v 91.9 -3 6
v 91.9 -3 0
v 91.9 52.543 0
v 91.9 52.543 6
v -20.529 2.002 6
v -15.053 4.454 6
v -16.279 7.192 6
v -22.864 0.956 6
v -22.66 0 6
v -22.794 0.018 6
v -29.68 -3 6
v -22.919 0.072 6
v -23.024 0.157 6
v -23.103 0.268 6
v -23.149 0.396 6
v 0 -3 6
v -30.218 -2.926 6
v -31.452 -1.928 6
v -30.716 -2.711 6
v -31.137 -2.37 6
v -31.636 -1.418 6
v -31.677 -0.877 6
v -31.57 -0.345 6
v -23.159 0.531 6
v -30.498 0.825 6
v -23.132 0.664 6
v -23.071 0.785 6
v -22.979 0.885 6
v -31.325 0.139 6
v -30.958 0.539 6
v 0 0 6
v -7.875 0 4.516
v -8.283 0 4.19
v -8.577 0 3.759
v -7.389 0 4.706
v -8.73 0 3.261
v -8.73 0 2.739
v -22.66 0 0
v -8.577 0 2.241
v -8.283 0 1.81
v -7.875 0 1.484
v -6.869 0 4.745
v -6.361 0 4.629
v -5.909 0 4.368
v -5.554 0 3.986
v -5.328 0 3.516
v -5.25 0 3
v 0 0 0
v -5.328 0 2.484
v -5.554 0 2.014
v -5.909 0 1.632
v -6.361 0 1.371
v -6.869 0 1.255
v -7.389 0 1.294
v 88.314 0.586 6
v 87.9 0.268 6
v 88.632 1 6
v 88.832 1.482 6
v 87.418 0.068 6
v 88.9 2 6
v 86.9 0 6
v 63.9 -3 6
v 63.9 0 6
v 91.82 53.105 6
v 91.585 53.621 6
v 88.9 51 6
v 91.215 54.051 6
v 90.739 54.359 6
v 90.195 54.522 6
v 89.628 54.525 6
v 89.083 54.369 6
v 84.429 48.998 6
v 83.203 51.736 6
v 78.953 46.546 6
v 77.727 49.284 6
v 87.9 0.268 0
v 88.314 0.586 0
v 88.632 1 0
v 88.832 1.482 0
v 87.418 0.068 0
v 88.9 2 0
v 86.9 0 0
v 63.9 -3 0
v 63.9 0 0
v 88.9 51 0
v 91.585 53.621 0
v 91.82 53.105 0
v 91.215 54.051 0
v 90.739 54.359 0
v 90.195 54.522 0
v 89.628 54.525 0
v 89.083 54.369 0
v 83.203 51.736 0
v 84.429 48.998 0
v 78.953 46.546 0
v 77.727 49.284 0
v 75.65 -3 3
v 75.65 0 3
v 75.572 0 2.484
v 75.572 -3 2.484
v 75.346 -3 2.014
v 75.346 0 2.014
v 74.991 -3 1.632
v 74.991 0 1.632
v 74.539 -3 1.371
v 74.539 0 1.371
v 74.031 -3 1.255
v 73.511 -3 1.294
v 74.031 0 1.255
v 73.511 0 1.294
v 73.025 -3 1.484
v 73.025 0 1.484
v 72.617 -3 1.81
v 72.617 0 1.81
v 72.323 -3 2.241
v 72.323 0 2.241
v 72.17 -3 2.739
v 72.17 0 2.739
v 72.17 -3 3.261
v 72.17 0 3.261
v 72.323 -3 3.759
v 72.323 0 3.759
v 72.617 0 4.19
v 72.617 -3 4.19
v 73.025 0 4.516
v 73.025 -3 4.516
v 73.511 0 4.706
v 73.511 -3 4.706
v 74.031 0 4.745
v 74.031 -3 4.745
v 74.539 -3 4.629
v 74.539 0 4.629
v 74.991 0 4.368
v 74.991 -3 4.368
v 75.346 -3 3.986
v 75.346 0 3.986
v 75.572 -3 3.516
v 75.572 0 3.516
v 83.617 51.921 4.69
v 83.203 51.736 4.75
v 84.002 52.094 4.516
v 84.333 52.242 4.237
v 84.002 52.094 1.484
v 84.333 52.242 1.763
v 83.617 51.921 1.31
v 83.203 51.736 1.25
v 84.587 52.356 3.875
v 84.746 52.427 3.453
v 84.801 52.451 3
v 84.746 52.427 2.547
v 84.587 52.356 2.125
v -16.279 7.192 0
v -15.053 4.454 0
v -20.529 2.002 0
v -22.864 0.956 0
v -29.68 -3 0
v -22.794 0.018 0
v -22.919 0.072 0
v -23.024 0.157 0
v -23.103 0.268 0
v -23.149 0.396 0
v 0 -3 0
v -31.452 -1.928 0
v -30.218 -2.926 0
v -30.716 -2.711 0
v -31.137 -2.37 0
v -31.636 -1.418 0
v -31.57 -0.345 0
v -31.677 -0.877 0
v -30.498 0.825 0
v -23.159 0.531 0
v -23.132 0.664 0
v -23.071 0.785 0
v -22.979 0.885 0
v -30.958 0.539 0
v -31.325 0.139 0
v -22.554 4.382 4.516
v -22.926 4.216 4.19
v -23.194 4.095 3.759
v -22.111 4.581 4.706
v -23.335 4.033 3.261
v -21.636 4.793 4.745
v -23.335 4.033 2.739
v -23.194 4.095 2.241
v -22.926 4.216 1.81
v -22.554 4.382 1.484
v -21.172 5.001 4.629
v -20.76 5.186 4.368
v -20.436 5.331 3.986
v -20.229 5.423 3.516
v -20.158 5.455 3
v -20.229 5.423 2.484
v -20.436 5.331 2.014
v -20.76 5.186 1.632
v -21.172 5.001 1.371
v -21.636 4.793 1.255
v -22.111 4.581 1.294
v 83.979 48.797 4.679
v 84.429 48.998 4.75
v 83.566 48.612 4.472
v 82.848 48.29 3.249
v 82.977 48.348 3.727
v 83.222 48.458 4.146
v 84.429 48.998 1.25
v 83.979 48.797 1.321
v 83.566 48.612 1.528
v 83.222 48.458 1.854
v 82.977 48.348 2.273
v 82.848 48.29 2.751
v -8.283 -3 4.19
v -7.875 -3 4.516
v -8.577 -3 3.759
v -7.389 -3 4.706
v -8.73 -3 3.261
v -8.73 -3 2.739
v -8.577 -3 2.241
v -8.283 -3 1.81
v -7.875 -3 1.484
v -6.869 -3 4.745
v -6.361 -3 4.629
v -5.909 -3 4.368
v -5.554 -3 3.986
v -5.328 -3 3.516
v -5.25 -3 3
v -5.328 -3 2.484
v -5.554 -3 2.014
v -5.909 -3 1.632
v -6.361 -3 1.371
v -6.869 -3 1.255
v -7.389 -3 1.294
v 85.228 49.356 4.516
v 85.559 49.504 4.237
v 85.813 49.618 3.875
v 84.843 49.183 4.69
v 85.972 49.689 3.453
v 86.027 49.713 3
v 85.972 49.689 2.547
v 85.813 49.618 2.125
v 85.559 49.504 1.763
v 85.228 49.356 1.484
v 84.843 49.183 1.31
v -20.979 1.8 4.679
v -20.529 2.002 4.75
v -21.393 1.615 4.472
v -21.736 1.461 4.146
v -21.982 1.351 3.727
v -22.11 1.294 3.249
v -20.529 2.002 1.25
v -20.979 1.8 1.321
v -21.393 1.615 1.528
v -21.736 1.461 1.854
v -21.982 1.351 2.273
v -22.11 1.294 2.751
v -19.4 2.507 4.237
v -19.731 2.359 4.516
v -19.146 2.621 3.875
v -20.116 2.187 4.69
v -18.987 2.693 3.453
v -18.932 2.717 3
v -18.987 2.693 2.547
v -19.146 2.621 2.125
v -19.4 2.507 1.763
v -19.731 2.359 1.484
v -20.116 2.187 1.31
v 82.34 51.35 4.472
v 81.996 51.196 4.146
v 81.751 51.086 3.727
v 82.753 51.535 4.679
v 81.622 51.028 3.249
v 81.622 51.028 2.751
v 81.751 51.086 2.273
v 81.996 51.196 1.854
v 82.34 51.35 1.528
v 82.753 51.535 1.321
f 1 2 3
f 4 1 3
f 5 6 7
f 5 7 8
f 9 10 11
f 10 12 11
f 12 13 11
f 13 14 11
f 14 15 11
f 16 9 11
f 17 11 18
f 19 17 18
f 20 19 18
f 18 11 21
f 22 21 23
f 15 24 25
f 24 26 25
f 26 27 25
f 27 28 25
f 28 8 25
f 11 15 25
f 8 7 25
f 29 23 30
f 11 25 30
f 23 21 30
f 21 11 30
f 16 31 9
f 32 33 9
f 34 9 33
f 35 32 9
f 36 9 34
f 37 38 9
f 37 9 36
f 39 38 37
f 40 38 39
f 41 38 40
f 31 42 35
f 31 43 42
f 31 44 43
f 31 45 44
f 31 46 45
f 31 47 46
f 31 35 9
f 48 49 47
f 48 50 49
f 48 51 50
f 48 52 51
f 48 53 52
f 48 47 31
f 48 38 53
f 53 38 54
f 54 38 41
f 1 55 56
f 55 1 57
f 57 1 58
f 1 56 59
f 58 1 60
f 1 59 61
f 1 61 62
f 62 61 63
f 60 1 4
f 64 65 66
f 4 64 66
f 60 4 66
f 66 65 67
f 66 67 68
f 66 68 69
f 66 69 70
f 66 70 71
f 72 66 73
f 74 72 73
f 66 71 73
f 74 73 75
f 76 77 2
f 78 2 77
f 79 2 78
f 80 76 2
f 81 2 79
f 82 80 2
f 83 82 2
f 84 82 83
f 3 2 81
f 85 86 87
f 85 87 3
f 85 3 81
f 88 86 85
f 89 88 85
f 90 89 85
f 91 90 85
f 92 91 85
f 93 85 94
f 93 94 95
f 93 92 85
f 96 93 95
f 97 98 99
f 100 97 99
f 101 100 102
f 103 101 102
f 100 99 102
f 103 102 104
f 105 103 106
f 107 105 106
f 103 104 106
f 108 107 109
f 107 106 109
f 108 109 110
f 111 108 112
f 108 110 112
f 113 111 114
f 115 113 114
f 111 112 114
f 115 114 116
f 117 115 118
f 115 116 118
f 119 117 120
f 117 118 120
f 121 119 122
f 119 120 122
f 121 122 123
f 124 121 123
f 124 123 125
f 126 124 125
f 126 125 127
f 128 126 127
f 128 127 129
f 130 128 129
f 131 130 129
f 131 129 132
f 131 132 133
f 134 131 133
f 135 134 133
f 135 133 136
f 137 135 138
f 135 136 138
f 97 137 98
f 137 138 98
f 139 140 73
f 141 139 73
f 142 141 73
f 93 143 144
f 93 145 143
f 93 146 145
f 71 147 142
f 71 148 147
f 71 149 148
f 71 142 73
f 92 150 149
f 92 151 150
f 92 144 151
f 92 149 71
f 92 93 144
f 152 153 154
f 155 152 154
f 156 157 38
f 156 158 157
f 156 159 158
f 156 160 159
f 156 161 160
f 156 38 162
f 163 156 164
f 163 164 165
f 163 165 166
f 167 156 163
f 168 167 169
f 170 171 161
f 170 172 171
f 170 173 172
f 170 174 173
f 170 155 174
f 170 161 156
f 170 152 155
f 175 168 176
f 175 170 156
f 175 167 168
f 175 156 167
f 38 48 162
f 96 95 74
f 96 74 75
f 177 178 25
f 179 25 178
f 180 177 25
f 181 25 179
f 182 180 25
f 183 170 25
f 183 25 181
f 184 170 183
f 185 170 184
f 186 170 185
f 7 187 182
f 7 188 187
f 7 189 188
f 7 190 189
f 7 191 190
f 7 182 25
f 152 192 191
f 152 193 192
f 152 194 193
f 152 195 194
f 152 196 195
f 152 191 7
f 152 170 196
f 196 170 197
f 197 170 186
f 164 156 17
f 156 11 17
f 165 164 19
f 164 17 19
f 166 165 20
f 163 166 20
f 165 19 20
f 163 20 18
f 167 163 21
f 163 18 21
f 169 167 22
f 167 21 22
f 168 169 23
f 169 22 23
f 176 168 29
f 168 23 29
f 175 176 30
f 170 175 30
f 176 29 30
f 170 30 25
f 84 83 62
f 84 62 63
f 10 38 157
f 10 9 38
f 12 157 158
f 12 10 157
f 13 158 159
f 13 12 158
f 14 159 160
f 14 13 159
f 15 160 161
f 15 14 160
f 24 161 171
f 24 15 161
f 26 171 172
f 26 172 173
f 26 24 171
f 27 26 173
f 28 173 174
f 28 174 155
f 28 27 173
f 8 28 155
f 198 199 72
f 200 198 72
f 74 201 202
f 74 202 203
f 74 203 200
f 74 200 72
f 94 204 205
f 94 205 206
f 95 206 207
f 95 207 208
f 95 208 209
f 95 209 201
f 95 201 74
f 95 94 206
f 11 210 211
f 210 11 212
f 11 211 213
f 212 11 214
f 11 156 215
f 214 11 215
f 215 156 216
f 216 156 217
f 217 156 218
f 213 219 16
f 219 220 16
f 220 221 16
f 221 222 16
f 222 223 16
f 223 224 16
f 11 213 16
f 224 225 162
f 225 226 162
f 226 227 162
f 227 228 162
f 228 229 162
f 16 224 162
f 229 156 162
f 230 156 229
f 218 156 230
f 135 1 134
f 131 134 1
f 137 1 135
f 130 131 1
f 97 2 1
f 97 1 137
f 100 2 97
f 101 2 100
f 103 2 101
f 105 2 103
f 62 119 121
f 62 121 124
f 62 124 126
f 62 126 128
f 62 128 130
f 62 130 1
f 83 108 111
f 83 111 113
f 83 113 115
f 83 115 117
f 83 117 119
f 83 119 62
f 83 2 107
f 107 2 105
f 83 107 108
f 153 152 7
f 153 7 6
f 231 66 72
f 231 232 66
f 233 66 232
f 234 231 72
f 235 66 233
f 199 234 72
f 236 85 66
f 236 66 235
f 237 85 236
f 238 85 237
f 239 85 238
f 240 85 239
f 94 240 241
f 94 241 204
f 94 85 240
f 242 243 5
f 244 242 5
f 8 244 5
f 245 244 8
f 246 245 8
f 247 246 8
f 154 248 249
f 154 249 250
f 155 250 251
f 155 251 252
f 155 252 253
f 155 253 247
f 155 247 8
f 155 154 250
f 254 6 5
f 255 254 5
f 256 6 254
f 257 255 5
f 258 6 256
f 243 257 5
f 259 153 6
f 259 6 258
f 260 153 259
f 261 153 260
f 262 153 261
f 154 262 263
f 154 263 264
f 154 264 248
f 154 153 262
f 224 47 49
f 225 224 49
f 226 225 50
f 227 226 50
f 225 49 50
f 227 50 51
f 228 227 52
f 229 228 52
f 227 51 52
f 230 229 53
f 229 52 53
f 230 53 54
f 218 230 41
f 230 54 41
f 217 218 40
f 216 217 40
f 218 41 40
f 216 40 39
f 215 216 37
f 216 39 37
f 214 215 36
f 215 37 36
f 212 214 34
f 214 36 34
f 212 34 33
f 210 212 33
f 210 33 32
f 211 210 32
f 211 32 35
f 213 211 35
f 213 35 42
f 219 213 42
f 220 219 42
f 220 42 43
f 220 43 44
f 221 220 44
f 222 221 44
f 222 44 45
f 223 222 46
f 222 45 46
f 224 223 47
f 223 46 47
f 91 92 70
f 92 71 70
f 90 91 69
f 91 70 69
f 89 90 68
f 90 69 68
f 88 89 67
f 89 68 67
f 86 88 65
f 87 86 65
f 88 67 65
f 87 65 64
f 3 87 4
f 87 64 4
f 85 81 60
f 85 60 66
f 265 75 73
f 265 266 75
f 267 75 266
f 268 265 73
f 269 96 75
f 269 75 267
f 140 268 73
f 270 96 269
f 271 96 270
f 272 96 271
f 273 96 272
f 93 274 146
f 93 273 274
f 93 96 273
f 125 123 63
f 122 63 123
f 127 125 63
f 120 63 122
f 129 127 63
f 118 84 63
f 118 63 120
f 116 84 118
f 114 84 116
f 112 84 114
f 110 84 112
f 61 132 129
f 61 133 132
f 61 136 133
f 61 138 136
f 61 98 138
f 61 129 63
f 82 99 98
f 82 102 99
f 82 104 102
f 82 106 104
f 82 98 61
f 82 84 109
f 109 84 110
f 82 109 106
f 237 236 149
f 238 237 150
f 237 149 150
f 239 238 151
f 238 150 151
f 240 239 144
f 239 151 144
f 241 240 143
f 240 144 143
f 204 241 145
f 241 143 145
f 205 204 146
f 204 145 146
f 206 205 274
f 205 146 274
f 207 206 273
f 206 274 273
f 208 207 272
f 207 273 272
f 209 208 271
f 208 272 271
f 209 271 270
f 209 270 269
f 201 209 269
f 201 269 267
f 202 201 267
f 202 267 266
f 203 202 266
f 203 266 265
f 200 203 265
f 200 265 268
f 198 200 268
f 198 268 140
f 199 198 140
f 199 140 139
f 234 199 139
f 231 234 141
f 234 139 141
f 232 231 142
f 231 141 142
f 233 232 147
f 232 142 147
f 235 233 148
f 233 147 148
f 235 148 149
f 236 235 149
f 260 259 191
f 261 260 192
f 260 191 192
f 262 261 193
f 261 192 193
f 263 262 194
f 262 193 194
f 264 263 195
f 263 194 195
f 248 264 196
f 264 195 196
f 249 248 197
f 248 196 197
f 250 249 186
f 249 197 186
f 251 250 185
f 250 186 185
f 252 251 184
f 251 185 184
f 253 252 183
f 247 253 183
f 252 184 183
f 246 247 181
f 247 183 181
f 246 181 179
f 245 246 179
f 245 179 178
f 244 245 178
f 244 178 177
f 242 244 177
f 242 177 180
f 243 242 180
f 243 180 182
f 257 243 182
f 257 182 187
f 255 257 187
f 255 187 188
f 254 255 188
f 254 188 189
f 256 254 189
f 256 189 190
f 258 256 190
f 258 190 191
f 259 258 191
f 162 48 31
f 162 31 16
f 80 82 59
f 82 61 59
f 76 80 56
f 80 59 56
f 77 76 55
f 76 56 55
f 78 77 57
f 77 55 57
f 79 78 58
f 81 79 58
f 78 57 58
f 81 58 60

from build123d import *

# Parameters (mm, degrees)
BOSS_EXTRUDE1_DEPTH   = 6
BOSS_EXTRUDE1_2_DEPTH = 6
FILLET1_R             = 2
FILLET2_R             = 2
FILLET3_R             = 2
FILLET4_R             = 0.5
SKETCH2_R             = 1.75
CUT_EXTRUDE1_DEPTH    = 3
SKETCH3_R             = 1.75
CUT_EXTRUDE2_DEPTH    = 3


with BuildPart() as part:
    # Sketch1 → Boss-Extrude1 (new body)
    with BuildSketch(Plane.XY):
        Polygon((-25, 0), (0, 0), (0, -3), (-25, -3), (-39.040980861, -3), (-16.279249839, 7.191819861), (-15.053255633, 4.453766135), (-20.529363085, 2.001777723), align=None)
    extrude(amount=BOSS_EXTRUDE1_DEPTH)

    # Fillet1
    fillet1_edges = [part.edges().sort_by_distance(p)[0] for p in [
        (-39.040980861, -3, 3),
    ]]
    fillet(fillet1_edges, radius=FILLET1_R)

    # Fillet4
    fillet4_edges = [part.edges().sort_by_distance(p)[0] for p in [
        (-25, 0, 3),
    ]]
    fillet(fillet4_edges, radius=FILLET4_R)


with BuildPart() as body_2:
    # Sketch1 → Boss-Extrude1 2 (new body)
    with BuildSketch(Plane.XY):
        Polygon((88.9, 0), (88.9, 51), (84.429363085, 48.998222277), (78.953255633, 46.546233865), (77.727261427, 49.284287592), (83.203368879, 51.736276003), (91.9, 55.630289938), (91.9, 51), (91.9, -3), (63.9, -3), (63.9, 0), align=None)
    extrude(amount=BOSS_EXTRUDE1_2_DEPTH)

    # Fillet2
    fillet2_edges = [body_2.edges().sort_by_distance(p)[0] for p in [
        (91.9, 55.630289938, 3),
    ]]
    fillet(fillet2_edges, radius=FILLET2_R)

    # Fillet3
    fillet3_edges = [body_2.edges().sort_by_distance(p)[0] for p in [
        (88.9, 0, 3),
    ]]
    fillet(fillet3_edges, radius=FILLET3_R)


with BuildPart() as cut_extrude1_tool:
    # Sketch2 → Cut-Extrude1 (new body)
    with BuildSketch(Plane(origin=(-5.401165852, 12.062603735, 0), x_dir=(0.912684575, 0.408664735, 0), z_dir=(-0.408664735, 0.912684575, 0))):
        with Locations((97.081222933, -3)):
            Circle(SKETCH2_R)
        with Locations((-17.918777067, -3)):
            Circle(SKETCH2_R)
    extrude(amount=-CUT_EXTRUDE1_DEPTH)


with BuildPart() as part_1:
    add(part.part)

    # Cut-Extrude1: cut by cut_extrude1_tool
    add(cut_extrude1_tool.part, mode=Mode.SUBTRACT)


with BuildPart() as body_2_1:
    add(body_2.part)

    # Cut-Extrude1: cut by cut_extrude1_tool
    add(cut_extrude1_tool.part, mode=Mode.SUBTRACT)


with BuildPart() as cut_extrude2_tool:
    # Sketch3 → Cut-Extrude2 (new body)
    with BuildSketch(Plane(origin=(0, 0, 0), x_dir=(1, 0, 0), z_dir=(0, 1, 0))):
        with Locations((73.9, -3)):
            Circle(SKETCH3_R)
        with Locations((-7, -3)):
            Circle(SKETCH3_R)
    extrude(amount=-CUT_EXTRUDE2_DEPTH)


with BuildPart() as part_2:
    add(part_1.part)

    # Cut-Extrude2: cut by cut_extrude2_tool
    add(cut_extrude2_tool.part, mode=Mode.SUBTRACT)


with BuildPart() as body_2_2:
    add(body_2_1.part)

    # Cut-Extrude2: cut by cut_extrude2_tool
    add(cut_extrude2_tool.part, mode=Mode.SUBTRACT)


solid = Compound([part_2.part, body_2_2.part])
